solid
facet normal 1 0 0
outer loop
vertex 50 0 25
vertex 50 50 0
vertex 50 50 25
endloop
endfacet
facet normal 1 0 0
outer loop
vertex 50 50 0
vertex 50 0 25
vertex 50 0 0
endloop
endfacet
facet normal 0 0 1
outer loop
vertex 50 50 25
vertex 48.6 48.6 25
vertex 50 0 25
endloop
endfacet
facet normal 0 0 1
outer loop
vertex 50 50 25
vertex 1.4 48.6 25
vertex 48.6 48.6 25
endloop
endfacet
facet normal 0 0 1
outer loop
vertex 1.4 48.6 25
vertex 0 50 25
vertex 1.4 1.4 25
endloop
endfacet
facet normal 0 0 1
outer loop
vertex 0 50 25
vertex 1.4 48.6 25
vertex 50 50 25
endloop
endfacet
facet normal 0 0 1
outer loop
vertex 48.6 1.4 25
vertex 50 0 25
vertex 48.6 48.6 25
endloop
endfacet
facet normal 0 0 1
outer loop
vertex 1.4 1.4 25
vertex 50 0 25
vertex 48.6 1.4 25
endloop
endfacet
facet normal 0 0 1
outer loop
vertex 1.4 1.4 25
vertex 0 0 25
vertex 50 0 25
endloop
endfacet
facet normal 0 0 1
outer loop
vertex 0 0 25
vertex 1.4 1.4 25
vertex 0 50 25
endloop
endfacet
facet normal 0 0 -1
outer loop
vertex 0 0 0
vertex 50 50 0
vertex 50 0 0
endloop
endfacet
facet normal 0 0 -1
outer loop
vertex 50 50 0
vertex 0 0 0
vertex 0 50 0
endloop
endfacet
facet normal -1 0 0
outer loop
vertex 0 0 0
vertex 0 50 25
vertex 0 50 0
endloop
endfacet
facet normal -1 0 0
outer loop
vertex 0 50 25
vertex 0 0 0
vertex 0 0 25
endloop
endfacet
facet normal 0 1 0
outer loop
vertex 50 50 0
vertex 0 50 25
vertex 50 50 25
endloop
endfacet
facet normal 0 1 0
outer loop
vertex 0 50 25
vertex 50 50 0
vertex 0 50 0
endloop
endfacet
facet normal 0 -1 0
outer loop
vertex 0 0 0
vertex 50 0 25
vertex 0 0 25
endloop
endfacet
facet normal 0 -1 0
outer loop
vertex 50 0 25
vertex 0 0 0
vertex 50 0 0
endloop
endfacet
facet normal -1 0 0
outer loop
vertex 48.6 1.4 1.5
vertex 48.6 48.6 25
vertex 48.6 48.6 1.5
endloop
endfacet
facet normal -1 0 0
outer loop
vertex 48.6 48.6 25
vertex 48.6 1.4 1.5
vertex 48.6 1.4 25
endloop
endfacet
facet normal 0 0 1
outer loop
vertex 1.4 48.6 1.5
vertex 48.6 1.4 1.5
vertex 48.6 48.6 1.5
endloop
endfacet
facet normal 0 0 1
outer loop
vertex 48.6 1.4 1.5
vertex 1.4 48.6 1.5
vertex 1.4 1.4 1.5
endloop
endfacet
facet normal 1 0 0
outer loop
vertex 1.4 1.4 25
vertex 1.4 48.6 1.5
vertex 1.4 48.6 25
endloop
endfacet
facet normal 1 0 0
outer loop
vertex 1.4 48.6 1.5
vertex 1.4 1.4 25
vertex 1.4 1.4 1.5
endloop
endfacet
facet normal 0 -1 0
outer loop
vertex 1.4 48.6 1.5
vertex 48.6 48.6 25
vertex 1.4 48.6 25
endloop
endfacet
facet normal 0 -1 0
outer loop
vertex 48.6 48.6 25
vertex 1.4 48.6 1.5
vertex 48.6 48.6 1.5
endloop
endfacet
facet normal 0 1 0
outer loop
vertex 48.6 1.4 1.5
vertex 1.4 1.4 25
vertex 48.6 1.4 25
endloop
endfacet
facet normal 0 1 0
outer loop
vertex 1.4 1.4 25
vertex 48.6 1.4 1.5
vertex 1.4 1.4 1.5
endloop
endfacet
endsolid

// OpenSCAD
$fn = 32;

// ----------------------------------------------------------------------
// Open box: 1.4 mm walls
// ----------------------------------------------------------------------

// --- parameters (mm) ---
box_l = 50;               // outer length, X
box_w = 50;               // outer width, Y
box_h = 25;               // outer height, Z
wall = 1.4;               // wall thickness
floor = 1.5;              // floor thickness

difference() {
  cube([box_l, box_w, box_h]);
  translate([wall, wall, floor])
    cube([box_l - 2 * wall, box_w - 2 * wall, box_h]);
}
